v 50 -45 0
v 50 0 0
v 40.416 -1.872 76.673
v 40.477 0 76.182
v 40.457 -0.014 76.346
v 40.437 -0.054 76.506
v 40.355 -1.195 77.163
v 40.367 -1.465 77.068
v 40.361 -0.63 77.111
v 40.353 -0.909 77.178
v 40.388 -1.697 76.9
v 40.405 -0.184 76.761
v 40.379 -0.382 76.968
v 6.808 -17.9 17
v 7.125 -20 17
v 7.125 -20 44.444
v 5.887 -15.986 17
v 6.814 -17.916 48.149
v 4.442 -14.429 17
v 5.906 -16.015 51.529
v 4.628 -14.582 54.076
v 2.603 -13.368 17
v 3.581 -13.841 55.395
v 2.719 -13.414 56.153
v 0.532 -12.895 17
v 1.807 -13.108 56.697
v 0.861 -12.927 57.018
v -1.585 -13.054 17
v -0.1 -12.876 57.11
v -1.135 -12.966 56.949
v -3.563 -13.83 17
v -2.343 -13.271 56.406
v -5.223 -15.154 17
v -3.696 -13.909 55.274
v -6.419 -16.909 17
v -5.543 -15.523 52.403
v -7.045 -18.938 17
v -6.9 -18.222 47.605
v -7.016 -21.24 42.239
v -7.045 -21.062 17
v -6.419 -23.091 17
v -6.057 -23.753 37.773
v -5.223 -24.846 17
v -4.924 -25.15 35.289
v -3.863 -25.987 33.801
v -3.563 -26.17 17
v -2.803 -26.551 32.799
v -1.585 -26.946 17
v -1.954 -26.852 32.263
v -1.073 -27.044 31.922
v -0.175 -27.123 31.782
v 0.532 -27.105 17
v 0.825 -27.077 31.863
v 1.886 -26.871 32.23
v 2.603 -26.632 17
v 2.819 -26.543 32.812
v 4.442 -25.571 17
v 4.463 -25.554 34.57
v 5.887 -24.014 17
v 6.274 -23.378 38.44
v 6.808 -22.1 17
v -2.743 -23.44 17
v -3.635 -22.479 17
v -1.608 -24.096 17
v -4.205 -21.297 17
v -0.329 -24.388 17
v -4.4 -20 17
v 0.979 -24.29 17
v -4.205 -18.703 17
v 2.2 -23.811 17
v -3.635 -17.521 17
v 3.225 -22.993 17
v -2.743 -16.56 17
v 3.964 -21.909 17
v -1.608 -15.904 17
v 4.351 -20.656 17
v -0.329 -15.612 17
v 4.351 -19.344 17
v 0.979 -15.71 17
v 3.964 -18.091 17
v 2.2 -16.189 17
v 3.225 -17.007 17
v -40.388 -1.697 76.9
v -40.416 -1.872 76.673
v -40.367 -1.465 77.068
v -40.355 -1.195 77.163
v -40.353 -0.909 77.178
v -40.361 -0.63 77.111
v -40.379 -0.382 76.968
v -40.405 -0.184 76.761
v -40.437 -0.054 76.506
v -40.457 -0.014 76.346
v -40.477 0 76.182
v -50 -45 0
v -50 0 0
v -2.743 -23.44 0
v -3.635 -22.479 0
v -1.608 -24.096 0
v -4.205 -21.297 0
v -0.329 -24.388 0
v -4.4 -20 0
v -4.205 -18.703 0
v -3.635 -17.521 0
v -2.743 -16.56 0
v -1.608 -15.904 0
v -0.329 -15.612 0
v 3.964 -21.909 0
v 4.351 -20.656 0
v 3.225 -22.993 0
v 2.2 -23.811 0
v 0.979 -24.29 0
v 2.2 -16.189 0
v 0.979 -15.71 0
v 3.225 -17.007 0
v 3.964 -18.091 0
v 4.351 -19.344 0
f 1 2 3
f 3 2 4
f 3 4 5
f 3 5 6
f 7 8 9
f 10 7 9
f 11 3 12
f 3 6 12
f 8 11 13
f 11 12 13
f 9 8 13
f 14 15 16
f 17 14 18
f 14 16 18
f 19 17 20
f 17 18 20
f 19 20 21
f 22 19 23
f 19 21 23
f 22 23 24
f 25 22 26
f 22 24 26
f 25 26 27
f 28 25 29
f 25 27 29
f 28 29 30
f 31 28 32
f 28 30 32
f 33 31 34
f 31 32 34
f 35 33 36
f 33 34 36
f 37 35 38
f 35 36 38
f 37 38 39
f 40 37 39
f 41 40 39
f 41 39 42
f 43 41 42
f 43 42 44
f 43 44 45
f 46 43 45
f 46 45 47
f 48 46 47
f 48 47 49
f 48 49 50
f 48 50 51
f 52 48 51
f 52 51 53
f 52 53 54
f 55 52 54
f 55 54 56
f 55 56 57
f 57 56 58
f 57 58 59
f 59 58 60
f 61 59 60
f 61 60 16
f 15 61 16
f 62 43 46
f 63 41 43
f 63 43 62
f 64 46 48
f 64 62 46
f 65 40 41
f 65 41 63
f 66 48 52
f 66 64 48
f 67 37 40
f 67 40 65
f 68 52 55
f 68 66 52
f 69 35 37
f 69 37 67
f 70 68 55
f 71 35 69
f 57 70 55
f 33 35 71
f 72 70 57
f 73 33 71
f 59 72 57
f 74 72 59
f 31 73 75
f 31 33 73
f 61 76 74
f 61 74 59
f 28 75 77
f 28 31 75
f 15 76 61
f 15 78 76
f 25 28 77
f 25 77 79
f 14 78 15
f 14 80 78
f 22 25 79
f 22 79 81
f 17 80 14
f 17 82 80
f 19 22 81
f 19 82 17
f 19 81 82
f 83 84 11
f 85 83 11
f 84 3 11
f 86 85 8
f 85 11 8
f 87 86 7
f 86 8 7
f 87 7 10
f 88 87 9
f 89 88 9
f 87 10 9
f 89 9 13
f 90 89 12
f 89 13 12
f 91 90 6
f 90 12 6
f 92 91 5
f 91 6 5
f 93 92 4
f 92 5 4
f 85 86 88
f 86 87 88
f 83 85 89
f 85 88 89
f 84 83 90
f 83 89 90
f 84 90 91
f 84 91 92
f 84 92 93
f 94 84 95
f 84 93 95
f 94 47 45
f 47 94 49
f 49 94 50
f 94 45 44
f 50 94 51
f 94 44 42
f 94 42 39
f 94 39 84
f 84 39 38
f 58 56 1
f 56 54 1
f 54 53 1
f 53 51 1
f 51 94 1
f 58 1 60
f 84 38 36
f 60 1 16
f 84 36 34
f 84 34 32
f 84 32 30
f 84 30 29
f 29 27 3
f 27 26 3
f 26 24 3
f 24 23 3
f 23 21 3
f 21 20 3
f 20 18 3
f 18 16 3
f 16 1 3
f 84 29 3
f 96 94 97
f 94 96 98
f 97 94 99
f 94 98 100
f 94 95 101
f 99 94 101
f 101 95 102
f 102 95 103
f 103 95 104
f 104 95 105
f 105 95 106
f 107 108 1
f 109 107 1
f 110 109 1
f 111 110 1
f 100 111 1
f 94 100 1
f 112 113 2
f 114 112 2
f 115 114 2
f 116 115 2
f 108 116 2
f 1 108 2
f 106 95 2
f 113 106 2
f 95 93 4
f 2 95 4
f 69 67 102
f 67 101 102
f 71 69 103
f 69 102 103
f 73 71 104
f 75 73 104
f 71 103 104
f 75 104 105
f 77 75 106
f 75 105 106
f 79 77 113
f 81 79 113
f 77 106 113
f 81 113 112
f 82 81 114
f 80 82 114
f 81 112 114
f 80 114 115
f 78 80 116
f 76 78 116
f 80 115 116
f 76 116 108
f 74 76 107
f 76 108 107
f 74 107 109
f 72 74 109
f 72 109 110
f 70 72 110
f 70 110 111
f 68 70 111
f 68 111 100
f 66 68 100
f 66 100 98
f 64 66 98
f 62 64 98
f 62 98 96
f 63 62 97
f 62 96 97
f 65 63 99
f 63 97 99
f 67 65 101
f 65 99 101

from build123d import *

# Parameters (mm, degrees)
F1_DEPTH       = 45
F3_DEPTH       = 50.001
F3_DEPTH_BACK  = 50.001
F6_D           = 8.8
F6_CBORE_D     = 14.25
F6_CBORE_DEPTH = 8
F5_R           = 7.125
F7_DEPTH       = 80
F8_R           = 1


with BuildPart() as f1:
    # F0 (on Front) → F1 (new body)
    with BuildSketch(Plane.XZ):
        Polygon((-50, 0), (50, 0), (40, 80), (-40, 80), align=None)
    extrude(amount=F1_DEPTH)

    # F2 (on Right) → F3 (cut, two sides)
    with BuildSketch(Plane.YZ) as f3_sk:
        Polygon((-45, 0), (0, 80), (-45, 80), align=None)
    extrude(amount=-F3_DEPTH, mode=Mode.SUBTRACT)
    extrude(f3_sk.sketch, amount=F3_DEPTH_BACK, mode=Mode.SUBTRACT)

    # F6 (through all)
    with Locations(Plane.XY.offset(25)):
        with Locations((0, -20)):
            CounterBoreHole(F6_D / 2, F6_CBORE_D / 2, F6_CBORE_DEPTH)

    # F5 (on offset) → F7 (cut)
    with BuildSketch(Plane.XY.offset(25)):
        with Locations((0, -20)):
            Circle(F5_R)
    extrude(amount=F7_DEPTH, mode=Mode.SUBTRACT)

    # F8
    f8_edges = [f1.edges().sort_by_distance(p)[0] for p in [
        (0, 0, 80),
    ]]
    fillet(f8_edges, radius=F8_R)


solid = f1.part
